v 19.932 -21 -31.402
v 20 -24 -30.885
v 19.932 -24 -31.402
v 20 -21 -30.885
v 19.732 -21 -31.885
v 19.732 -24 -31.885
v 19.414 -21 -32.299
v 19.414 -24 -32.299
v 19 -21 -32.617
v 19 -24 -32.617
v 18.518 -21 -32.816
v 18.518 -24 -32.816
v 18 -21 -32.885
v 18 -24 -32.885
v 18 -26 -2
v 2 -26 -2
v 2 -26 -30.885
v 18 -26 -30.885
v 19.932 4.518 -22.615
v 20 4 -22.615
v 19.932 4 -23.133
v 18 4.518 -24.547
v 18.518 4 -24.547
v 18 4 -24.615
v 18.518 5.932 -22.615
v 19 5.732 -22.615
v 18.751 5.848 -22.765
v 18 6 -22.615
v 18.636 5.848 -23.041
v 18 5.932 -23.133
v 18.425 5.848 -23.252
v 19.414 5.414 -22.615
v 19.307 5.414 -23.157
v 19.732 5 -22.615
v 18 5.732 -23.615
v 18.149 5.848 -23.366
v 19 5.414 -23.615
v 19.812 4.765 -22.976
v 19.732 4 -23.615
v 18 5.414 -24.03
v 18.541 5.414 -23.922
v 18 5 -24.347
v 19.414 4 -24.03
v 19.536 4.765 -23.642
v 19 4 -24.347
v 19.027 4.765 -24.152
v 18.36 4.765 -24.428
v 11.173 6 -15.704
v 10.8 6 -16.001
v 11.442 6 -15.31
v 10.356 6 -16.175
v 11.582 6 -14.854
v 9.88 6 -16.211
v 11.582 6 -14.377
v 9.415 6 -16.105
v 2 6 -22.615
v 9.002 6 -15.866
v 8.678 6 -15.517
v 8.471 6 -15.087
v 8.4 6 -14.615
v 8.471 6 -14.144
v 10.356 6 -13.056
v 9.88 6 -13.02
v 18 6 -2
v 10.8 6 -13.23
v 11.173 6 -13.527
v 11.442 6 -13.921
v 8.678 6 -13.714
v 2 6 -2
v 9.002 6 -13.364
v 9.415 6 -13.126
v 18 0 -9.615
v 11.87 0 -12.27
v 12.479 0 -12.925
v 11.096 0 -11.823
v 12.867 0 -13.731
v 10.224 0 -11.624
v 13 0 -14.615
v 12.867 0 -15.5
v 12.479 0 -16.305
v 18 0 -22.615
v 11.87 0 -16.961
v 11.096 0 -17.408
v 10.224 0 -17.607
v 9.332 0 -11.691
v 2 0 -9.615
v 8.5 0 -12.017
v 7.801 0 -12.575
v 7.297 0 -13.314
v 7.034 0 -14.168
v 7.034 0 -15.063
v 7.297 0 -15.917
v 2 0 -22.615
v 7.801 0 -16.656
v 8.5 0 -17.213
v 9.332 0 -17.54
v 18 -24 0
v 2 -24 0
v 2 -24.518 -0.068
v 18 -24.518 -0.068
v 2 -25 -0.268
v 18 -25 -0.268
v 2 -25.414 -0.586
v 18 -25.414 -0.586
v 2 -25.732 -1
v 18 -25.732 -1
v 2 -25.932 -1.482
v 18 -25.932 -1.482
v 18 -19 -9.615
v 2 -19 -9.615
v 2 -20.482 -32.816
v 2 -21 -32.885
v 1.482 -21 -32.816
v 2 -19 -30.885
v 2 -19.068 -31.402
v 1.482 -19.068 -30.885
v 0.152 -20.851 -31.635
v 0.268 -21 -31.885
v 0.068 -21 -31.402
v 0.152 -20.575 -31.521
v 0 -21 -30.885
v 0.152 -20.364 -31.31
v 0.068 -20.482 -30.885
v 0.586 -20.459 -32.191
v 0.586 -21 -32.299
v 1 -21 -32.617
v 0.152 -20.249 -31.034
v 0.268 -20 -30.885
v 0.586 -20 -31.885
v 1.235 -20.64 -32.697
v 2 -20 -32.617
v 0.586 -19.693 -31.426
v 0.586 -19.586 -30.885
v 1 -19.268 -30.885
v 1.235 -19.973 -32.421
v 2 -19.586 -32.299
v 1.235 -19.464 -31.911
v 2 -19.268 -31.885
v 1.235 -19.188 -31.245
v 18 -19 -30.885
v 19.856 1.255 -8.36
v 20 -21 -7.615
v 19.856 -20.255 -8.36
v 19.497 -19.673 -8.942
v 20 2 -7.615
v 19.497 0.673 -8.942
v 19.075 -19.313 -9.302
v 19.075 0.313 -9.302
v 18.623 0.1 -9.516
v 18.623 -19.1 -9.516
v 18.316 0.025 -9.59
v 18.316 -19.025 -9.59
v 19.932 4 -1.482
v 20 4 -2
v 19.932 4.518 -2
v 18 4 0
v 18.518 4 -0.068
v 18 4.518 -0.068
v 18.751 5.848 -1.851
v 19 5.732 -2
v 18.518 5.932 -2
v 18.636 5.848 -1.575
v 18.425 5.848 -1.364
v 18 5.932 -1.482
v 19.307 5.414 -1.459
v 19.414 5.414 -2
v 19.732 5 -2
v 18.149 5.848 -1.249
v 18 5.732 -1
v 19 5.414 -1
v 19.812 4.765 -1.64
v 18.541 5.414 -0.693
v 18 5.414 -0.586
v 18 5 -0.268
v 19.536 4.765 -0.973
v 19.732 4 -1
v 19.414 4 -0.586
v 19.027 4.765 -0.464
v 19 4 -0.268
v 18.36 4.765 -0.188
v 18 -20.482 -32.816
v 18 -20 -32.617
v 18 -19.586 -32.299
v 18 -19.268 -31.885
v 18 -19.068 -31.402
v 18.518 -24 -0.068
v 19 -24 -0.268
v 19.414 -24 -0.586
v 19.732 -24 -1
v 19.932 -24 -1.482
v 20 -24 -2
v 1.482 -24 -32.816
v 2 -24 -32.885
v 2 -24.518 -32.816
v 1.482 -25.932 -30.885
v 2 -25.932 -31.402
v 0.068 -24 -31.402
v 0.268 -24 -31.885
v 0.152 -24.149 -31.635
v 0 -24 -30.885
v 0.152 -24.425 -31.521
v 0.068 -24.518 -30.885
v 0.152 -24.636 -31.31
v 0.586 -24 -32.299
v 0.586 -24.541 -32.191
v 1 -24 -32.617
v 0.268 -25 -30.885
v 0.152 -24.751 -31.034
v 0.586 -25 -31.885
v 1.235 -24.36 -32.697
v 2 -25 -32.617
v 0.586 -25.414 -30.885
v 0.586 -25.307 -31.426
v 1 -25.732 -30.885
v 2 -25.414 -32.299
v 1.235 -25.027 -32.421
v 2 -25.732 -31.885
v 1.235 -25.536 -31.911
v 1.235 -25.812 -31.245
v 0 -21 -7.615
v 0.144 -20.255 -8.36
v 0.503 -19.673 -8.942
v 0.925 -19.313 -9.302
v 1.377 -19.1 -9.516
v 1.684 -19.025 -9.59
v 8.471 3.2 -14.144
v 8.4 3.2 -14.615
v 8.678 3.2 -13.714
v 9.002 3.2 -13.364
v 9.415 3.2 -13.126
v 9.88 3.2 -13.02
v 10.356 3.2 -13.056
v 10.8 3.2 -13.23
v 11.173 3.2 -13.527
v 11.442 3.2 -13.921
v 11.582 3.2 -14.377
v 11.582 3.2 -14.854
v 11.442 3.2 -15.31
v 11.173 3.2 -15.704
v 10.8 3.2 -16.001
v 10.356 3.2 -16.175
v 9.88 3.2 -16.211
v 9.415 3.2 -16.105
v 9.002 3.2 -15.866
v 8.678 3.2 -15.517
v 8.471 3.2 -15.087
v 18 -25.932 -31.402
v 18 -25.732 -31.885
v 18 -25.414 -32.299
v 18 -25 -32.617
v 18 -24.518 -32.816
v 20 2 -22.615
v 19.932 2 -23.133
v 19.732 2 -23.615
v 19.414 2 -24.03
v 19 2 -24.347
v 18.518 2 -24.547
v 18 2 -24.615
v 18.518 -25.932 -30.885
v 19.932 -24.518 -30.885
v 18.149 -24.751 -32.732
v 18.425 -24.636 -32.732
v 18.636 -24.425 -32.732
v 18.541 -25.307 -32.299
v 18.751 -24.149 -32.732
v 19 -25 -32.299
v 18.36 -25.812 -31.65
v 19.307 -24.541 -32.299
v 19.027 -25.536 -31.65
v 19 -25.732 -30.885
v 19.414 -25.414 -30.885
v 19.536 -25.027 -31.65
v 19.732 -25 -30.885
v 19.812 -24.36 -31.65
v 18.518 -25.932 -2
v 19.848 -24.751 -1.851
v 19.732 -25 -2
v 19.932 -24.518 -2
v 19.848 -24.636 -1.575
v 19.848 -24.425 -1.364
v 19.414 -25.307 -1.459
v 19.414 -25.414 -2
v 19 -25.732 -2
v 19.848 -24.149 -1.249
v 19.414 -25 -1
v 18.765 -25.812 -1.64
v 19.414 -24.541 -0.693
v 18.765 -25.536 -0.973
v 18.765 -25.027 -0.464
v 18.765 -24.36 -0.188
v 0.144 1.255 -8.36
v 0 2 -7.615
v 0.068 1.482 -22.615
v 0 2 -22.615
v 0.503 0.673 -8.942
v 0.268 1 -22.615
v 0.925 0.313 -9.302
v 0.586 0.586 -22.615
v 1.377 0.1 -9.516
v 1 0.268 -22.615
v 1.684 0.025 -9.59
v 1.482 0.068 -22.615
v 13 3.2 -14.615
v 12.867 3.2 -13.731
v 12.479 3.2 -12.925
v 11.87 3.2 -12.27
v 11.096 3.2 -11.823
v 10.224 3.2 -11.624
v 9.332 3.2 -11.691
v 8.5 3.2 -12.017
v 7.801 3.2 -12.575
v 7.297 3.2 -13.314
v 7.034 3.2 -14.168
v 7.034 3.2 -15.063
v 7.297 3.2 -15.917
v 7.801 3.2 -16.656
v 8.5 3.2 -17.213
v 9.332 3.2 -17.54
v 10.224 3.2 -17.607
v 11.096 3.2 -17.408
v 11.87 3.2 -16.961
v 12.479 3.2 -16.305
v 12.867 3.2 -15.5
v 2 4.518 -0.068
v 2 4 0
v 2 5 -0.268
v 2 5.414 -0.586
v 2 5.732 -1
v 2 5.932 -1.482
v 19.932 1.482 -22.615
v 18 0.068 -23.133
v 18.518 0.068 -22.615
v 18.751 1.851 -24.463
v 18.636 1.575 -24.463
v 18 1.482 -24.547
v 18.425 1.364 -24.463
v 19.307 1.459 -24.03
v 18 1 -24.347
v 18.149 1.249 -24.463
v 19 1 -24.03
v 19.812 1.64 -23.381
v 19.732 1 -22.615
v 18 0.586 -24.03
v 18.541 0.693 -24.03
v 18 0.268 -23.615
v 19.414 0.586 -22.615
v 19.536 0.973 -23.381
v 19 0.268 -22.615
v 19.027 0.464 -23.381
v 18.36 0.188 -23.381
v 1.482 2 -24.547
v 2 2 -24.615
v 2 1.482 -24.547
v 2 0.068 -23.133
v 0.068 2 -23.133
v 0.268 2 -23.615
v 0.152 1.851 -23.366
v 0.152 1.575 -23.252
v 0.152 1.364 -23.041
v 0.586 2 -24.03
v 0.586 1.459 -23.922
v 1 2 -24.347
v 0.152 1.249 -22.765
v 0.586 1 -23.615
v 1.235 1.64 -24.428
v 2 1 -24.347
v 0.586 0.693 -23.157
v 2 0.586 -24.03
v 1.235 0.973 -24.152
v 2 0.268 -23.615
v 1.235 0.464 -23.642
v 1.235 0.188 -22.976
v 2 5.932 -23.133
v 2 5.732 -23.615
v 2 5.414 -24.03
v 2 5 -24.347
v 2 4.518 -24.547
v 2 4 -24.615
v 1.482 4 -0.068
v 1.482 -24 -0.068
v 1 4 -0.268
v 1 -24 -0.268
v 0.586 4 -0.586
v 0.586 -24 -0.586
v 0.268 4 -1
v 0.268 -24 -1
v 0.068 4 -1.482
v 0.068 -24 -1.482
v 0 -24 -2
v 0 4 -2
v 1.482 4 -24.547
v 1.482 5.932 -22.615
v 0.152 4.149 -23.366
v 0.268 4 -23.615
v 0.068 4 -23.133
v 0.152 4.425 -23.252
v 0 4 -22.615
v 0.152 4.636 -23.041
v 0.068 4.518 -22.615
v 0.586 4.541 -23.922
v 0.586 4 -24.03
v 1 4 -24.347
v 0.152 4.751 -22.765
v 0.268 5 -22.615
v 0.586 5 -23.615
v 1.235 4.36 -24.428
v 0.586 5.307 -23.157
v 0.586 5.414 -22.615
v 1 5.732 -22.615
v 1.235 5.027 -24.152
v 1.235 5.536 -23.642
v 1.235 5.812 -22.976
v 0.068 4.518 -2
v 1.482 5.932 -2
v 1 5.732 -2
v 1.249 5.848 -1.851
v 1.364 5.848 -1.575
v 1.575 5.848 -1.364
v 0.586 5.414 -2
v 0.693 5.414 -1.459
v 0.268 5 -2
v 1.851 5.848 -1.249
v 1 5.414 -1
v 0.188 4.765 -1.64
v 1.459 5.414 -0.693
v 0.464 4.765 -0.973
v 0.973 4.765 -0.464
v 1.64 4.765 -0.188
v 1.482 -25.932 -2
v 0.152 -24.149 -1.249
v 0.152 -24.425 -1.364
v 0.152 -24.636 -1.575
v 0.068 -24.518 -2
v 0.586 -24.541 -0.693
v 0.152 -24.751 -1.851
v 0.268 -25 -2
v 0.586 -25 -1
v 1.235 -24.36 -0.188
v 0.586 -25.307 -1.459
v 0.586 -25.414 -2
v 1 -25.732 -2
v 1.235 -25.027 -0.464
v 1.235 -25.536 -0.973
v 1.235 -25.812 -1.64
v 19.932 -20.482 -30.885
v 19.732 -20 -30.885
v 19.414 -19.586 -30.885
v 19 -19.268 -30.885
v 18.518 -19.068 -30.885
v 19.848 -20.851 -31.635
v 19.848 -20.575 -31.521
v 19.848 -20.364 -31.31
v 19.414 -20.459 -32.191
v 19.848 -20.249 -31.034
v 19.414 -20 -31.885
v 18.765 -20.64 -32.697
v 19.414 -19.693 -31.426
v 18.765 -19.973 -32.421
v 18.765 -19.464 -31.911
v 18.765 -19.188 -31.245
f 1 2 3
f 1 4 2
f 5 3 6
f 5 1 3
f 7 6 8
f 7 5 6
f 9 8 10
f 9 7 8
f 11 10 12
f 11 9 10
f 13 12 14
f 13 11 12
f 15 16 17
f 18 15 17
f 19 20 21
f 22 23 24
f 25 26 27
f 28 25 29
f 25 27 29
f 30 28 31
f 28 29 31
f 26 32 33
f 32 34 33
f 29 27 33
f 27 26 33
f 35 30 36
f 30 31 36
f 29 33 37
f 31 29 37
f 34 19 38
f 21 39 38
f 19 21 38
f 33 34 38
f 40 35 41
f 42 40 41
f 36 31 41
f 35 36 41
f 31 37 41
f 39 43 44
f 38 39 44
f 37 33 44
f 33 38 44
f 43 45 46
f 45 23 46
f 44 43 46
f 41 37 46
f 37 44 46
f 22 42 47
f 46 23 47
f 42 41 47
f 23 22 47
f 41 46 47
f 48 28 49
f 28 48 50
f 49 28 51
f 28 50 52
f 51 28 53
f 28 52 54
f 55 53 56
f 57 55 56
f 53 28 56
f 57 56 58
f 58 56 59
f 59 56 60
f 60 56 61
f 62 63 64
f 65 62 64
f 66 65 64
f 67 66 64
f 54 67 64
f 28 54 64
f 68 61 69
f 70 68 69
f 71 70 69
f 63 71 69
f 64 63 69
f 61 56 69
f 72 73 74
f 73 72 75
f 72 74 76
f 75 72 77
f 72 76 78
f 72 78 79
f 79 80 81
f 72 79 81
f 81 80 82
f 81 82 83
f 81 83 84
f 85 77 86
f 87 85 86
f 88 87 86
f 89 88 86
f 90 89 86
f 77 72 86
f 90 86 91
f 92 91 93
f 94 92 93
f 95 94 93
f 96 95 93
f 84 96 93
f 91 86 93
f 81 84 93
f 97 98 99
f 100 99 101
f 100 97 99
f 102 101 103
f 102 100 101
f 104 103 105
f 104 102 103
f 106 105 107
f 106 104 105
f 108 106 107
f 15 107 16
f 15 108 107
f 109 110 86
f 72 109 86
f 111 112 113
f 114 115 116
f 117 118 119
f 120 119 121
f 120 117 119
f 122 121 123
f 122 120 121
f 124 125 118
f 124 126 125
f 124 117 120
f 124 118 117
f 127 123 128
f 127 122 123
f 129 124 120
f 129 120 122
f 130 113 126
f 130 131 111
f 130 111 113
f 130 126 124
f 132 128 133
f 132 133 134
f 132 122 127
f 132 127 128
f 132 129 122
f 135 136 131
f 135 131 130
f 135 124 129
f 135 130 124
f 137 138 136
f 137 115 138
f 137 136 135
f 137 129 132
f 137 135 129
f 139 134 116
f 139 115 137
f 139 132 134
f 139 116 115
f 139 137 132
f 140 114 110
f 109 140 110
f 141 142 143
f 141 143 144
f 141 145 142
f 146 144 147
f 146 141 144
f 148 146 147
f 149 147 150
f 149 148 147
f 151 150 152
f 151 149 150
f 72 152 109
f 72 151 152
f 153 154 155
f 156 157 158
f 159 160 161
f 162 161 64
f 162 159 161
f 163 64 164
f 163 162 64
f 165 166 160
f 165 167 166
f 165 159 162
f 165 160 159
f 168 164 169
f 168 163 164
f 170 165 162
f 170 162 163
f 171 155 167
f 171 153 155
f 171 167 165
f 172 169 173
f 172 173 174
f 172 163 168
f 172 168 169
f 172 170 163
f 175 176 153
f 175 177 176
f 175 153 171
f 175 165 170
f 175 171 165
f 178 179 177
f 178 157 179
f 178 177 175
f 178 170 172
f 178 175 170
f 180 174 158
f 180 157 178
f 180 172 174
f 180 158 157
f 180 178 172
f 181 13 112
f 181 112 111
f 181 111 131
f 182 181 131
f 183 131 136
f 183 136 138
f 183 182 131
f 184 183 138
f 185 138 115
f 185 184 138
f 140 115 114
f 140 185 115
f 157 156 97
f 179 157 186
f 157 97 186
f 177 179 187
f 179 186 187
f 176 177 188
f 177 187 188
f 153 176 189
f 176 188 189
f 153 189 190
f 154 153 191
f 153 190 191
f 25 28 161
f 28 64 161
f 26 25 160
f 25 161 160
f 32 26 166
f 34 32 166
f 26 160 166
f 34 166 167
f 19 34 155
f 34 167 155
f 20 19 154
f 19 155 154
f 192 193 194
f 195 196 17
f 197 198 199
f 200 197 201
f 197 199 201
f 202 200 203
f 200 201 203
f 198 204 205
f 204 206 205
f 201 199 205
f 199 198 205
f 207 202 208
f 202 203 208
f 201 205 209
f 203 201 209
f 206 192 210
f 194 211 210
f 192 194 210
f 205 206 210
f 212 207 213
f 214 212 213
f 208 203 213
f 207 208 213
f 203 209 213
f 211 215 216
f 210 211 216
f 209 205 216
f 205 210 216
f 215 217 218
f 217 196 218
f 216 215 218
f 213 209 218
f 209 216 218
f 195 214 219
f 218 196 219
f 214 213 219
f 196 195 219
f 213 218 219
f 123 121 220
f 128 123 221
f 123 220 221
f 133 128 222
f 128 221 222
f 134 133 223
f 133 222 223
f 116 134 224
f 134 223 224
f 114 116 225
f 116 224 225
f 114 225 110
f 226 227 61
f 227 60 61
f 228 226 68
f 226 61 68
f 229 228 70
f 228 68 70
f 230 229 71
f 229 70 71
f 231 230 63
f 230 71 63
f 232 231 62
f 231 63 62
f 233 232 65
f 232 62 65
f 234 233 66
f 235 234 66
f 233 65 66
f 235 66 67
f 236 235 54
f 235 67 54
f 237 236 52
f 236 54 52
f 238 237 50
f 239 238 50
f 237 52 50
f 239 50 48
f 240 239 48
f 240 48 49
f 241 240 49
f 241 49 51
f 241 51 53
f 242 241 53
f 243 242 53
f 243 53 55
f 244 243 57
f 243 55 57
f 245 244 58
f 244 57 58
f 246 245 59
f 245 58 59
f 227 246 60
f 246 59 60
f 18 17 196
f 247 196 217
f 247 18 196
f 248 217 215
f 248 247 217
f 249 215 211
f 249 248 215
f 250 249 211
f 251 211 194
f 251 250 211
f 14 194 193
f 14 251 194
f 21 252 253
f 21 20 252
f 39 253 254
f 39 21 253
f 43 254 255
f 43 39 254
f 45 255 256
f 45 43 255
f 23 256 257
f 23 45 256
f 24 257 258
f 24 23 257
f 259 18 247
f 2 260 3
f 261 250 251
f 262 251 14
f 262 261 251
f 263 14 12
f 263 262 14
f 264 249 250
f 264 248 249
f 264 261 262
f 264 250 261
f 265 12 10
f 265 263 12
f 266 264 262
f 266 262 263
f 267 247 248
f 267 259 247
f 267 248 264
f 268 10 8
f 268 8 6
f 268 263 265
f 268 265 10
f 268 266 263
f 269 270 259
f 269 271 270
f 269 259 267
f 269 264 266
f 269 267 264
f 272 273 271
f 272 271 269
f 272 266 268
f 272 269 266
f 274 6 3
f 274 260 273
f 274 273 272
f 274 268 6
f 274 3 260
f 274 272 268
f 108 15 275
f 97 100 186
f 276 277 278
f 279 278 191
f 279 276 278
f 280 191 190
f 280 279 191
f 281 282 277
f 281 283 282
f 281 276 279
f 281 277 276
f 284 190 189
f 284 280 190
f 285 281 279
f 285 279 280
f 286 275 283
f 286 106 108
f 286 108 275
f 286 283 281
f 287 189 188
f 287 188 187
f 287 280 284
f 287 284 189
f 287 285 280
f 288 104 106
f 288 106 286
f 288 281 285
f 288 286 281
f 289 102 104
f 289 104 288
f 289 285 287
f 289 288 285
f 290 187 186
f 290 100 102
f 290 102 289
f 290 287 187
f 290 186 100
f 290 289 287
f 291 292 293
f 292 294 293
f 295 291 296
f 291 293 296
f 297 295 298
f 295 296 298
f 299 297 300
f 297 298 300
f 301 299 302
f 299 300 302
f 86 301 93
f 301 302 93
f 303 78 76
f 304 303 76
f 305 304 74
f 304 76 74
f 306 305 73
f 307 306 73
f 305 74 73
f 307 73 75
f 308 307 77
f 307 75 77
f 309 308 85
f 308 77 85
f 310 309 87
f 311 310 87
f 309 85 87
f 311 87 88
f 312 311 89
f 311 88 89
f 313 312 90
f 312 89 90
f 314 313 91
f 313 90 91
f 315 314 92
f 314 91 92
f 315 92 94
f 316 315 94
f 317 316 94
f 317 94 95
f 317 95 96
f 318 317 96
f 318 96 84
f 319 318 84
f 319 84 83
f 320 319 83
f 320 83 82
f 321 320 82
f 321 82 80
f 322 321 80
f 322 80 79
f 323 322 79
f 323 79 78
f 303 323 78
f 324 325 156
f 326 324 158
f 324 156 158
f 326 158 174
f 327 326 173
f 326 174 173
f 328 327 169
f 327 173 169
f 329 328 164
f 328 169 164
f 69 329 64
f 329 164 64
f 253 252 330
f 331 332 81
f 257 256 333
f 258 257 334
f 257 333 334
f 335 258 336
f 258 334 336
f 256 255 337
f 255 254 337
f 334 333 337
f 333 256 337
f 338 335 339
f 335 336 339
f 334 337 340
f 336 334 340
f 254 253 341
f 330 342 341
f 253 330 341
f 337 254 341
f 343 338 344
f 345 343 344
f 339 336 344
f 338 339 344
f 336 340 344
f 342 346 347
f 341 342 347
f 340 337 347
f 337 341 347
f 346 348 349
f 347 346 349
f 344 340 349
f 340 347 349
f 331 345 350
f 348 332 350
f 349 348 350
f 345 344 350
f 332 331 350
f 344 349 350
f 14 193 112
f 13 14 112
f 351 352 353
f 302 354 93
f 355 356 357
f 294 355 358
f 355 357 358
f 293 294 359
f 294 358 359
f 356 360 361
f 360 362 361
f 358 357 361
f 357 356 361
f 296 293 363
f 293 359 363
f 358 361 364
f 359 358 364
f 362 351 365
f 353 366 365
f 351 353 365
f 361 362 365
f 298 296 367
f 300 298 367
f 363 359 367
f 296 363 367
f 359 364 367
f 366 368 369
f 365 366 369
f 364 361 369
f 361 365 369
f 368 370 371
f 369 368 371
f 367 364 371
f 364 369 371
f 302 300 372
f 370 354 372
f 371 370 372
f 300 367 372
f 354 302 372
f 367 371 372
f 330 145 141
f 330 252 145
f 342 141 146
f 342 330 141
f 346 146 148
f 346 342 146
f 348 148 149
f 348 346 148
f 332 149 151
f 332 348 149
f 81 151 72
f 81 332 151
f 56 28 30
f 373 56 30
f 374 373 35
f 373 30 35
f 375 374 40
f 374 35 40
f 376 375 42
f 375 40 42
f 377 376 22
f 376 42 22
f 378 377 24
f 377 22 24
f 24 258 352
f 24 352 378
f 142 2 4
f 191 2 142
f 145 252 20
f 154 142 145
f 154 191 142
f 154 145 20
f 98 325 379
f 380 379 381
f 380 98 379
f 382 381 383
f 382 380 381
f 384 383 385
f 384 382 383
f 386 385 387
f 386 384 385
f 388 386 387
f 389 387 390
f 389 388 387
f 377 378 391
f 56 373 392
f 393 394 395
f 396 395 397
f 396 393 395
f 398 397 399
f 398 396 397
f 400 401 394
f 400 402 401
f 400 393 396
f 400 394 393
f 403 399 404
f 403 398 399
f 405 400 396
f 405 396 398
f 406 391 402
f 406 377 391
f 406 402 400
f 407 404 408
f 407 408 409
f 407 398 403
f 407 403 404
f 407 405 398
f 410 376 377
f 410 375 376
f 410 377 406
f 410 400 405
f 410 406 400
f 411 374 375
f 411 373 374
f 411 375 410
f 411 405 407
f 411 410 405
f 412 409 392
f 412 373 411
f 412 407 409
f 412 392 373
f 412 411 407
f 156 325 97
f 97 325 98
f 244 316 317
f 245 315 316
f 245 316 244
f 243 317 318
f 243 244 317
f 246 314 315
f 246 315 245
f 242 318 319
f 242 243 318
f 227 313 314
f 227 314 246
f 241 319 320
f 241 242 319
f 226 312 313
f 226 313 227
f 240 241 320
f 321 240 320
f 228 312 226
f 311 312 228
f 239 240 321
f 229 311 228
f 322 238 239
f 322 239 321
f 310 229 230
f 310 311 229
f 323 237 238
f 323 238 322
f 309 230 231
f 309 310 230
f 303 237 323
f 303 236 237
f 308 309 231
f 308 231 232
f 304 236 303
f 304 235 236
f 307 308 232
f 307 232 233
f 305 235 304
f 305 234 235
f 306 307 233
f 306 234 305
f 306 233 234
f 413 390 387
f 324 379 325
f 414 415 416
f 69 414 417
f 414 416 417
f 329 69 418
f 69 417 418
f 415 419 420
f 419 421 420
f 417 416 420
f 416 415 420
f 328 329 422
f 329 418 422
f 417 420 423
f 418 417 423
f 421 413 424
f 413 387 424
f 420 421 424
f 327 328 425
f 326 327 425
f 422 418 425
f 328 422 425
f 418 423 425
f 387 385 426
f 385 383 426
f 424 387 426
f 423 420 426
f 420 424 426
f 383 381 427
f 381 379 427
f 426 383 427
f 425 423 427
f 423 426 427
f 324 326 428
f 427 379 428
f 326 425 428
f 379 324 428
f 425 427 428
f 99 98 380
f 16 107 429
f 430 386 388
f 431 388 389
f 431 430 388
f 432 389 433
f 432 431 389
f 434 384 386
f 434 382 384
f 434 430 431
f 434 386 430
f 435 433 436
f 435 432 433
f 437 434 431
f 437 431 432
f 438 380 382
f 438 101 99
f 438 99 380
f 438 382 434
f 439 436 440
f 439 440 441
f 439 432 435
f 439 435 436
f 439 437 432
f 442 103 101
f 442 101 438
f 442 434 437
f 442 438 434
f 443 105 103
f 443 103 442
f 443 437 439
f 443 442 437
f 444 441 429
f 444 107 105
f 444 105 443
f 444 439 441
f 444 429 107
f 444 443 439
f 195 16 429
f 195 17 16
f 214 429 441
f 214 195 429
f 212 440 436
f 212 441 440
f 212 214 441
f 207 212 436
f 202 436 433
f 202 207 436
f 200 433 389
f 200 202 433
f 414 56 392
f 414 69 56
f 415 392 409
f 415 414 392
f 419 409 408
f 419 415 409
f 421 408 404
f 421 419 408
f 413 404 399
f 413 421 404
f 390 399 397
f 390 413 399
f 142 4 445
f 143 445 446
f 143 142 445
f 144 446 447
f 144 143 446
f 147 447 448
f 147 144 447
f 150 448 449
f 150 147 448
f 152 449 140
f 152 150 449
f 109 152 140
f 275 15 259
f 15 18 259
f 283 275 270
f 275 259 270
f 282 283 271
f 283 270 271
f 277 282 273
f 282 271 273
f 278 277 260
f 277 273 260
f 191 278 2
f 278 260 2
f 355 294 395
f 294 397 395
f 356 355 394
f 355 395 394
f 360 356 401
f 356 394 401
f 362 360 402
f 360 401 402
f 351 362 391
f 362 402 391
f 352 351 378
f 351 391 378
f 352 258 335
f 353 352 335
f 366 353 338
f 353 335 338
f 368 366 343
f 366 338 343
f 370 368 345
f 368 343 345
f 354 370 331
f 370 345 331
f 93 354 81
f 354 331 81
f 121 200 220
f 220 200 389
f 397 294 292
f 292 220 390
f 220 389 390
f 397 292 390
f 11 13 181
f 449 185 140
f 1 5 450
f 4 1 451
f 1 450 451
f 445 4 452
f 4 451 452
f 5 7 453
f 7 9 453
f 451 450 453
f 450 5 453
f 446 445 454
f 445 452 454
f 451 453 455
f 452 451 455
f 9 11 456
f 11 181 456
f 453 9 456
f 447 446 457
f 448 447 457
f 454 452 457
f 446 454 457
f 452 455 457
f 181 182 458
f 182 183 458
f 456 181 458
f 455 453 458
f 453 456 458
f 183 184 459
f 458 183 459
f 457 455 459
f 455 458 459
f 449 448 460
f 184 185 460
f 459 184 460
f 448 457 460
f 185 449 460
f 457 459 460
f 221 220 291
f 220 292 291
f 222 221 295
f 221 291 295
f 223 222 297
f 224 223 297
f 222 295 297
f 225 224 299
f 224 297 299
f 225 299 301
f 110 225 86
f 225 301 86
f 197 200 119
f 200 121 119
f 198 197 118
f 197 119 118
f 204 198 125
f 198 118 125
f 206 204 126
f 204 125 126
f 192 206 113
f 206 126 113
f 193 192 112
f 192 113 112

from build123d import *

# Parameters (mm, degrees)
F1_DEPTH       = 20
F3_D           = 3.2
F3_DEPTH       = 10
F3_CBORE_D     = 6
F3_CBORE_DEPTH = 3.2
F4_R           = 2


with BuildPart() as f1:
    # F0 (on Right) → F1 (new body)
    with BuildSketch(Plane.YZ):
        Polygon((6, 0), (0, 0), (-26, 0), (-26, -32.884616), (-19, -32.884616), (-19, -9.615385), (0, -9.615385), (0, -24.615385), (6, -24.615385), align=None)
    extrude(amount=F1_DEPTH)

    # F3
    with Locations(Plane.XZ):
        with Locations((10, -14.615385)):
            CounterBoreHole(F3_D / 2, F3_CBORE_D / 2, F3_CBORE_DEPTH, depth=F3_DEPTH)

    # F4
    f4_edges = [f1.edges().sort_by_distance(p)[0] for p in [
        (10, -26, 0),
        (20, -26, -16.442308),
        (20, -10, 0),
        (10, -26, -32.884616),
        (10, -19, -32.884616),
        (0, -22.5, -32.884616),
        (20, -22.5, -32.884616),
        (20, -19, -21.250001),
        (20, -9.5, -9.615385),
        (20, 0, -17.115385),
        (20, 3, -24.615385),
        (20, 6, -12.307692),
        (10, 0, -24.615385),
        (10, 6, -24.615385),
        (0, 3, -24.615385),
        (0, -10, 0),
        (0, -26, -16.442308),
        (0, -19, -21.250001),
        (0, -9.5, -9.615385),
        (0, 0, -17.115385),
        (0, 6, -12.307692),
        (10, 6, 0),
    ]]
    fillet(f4_edges, radius=F4_R)


solid = f1.part
